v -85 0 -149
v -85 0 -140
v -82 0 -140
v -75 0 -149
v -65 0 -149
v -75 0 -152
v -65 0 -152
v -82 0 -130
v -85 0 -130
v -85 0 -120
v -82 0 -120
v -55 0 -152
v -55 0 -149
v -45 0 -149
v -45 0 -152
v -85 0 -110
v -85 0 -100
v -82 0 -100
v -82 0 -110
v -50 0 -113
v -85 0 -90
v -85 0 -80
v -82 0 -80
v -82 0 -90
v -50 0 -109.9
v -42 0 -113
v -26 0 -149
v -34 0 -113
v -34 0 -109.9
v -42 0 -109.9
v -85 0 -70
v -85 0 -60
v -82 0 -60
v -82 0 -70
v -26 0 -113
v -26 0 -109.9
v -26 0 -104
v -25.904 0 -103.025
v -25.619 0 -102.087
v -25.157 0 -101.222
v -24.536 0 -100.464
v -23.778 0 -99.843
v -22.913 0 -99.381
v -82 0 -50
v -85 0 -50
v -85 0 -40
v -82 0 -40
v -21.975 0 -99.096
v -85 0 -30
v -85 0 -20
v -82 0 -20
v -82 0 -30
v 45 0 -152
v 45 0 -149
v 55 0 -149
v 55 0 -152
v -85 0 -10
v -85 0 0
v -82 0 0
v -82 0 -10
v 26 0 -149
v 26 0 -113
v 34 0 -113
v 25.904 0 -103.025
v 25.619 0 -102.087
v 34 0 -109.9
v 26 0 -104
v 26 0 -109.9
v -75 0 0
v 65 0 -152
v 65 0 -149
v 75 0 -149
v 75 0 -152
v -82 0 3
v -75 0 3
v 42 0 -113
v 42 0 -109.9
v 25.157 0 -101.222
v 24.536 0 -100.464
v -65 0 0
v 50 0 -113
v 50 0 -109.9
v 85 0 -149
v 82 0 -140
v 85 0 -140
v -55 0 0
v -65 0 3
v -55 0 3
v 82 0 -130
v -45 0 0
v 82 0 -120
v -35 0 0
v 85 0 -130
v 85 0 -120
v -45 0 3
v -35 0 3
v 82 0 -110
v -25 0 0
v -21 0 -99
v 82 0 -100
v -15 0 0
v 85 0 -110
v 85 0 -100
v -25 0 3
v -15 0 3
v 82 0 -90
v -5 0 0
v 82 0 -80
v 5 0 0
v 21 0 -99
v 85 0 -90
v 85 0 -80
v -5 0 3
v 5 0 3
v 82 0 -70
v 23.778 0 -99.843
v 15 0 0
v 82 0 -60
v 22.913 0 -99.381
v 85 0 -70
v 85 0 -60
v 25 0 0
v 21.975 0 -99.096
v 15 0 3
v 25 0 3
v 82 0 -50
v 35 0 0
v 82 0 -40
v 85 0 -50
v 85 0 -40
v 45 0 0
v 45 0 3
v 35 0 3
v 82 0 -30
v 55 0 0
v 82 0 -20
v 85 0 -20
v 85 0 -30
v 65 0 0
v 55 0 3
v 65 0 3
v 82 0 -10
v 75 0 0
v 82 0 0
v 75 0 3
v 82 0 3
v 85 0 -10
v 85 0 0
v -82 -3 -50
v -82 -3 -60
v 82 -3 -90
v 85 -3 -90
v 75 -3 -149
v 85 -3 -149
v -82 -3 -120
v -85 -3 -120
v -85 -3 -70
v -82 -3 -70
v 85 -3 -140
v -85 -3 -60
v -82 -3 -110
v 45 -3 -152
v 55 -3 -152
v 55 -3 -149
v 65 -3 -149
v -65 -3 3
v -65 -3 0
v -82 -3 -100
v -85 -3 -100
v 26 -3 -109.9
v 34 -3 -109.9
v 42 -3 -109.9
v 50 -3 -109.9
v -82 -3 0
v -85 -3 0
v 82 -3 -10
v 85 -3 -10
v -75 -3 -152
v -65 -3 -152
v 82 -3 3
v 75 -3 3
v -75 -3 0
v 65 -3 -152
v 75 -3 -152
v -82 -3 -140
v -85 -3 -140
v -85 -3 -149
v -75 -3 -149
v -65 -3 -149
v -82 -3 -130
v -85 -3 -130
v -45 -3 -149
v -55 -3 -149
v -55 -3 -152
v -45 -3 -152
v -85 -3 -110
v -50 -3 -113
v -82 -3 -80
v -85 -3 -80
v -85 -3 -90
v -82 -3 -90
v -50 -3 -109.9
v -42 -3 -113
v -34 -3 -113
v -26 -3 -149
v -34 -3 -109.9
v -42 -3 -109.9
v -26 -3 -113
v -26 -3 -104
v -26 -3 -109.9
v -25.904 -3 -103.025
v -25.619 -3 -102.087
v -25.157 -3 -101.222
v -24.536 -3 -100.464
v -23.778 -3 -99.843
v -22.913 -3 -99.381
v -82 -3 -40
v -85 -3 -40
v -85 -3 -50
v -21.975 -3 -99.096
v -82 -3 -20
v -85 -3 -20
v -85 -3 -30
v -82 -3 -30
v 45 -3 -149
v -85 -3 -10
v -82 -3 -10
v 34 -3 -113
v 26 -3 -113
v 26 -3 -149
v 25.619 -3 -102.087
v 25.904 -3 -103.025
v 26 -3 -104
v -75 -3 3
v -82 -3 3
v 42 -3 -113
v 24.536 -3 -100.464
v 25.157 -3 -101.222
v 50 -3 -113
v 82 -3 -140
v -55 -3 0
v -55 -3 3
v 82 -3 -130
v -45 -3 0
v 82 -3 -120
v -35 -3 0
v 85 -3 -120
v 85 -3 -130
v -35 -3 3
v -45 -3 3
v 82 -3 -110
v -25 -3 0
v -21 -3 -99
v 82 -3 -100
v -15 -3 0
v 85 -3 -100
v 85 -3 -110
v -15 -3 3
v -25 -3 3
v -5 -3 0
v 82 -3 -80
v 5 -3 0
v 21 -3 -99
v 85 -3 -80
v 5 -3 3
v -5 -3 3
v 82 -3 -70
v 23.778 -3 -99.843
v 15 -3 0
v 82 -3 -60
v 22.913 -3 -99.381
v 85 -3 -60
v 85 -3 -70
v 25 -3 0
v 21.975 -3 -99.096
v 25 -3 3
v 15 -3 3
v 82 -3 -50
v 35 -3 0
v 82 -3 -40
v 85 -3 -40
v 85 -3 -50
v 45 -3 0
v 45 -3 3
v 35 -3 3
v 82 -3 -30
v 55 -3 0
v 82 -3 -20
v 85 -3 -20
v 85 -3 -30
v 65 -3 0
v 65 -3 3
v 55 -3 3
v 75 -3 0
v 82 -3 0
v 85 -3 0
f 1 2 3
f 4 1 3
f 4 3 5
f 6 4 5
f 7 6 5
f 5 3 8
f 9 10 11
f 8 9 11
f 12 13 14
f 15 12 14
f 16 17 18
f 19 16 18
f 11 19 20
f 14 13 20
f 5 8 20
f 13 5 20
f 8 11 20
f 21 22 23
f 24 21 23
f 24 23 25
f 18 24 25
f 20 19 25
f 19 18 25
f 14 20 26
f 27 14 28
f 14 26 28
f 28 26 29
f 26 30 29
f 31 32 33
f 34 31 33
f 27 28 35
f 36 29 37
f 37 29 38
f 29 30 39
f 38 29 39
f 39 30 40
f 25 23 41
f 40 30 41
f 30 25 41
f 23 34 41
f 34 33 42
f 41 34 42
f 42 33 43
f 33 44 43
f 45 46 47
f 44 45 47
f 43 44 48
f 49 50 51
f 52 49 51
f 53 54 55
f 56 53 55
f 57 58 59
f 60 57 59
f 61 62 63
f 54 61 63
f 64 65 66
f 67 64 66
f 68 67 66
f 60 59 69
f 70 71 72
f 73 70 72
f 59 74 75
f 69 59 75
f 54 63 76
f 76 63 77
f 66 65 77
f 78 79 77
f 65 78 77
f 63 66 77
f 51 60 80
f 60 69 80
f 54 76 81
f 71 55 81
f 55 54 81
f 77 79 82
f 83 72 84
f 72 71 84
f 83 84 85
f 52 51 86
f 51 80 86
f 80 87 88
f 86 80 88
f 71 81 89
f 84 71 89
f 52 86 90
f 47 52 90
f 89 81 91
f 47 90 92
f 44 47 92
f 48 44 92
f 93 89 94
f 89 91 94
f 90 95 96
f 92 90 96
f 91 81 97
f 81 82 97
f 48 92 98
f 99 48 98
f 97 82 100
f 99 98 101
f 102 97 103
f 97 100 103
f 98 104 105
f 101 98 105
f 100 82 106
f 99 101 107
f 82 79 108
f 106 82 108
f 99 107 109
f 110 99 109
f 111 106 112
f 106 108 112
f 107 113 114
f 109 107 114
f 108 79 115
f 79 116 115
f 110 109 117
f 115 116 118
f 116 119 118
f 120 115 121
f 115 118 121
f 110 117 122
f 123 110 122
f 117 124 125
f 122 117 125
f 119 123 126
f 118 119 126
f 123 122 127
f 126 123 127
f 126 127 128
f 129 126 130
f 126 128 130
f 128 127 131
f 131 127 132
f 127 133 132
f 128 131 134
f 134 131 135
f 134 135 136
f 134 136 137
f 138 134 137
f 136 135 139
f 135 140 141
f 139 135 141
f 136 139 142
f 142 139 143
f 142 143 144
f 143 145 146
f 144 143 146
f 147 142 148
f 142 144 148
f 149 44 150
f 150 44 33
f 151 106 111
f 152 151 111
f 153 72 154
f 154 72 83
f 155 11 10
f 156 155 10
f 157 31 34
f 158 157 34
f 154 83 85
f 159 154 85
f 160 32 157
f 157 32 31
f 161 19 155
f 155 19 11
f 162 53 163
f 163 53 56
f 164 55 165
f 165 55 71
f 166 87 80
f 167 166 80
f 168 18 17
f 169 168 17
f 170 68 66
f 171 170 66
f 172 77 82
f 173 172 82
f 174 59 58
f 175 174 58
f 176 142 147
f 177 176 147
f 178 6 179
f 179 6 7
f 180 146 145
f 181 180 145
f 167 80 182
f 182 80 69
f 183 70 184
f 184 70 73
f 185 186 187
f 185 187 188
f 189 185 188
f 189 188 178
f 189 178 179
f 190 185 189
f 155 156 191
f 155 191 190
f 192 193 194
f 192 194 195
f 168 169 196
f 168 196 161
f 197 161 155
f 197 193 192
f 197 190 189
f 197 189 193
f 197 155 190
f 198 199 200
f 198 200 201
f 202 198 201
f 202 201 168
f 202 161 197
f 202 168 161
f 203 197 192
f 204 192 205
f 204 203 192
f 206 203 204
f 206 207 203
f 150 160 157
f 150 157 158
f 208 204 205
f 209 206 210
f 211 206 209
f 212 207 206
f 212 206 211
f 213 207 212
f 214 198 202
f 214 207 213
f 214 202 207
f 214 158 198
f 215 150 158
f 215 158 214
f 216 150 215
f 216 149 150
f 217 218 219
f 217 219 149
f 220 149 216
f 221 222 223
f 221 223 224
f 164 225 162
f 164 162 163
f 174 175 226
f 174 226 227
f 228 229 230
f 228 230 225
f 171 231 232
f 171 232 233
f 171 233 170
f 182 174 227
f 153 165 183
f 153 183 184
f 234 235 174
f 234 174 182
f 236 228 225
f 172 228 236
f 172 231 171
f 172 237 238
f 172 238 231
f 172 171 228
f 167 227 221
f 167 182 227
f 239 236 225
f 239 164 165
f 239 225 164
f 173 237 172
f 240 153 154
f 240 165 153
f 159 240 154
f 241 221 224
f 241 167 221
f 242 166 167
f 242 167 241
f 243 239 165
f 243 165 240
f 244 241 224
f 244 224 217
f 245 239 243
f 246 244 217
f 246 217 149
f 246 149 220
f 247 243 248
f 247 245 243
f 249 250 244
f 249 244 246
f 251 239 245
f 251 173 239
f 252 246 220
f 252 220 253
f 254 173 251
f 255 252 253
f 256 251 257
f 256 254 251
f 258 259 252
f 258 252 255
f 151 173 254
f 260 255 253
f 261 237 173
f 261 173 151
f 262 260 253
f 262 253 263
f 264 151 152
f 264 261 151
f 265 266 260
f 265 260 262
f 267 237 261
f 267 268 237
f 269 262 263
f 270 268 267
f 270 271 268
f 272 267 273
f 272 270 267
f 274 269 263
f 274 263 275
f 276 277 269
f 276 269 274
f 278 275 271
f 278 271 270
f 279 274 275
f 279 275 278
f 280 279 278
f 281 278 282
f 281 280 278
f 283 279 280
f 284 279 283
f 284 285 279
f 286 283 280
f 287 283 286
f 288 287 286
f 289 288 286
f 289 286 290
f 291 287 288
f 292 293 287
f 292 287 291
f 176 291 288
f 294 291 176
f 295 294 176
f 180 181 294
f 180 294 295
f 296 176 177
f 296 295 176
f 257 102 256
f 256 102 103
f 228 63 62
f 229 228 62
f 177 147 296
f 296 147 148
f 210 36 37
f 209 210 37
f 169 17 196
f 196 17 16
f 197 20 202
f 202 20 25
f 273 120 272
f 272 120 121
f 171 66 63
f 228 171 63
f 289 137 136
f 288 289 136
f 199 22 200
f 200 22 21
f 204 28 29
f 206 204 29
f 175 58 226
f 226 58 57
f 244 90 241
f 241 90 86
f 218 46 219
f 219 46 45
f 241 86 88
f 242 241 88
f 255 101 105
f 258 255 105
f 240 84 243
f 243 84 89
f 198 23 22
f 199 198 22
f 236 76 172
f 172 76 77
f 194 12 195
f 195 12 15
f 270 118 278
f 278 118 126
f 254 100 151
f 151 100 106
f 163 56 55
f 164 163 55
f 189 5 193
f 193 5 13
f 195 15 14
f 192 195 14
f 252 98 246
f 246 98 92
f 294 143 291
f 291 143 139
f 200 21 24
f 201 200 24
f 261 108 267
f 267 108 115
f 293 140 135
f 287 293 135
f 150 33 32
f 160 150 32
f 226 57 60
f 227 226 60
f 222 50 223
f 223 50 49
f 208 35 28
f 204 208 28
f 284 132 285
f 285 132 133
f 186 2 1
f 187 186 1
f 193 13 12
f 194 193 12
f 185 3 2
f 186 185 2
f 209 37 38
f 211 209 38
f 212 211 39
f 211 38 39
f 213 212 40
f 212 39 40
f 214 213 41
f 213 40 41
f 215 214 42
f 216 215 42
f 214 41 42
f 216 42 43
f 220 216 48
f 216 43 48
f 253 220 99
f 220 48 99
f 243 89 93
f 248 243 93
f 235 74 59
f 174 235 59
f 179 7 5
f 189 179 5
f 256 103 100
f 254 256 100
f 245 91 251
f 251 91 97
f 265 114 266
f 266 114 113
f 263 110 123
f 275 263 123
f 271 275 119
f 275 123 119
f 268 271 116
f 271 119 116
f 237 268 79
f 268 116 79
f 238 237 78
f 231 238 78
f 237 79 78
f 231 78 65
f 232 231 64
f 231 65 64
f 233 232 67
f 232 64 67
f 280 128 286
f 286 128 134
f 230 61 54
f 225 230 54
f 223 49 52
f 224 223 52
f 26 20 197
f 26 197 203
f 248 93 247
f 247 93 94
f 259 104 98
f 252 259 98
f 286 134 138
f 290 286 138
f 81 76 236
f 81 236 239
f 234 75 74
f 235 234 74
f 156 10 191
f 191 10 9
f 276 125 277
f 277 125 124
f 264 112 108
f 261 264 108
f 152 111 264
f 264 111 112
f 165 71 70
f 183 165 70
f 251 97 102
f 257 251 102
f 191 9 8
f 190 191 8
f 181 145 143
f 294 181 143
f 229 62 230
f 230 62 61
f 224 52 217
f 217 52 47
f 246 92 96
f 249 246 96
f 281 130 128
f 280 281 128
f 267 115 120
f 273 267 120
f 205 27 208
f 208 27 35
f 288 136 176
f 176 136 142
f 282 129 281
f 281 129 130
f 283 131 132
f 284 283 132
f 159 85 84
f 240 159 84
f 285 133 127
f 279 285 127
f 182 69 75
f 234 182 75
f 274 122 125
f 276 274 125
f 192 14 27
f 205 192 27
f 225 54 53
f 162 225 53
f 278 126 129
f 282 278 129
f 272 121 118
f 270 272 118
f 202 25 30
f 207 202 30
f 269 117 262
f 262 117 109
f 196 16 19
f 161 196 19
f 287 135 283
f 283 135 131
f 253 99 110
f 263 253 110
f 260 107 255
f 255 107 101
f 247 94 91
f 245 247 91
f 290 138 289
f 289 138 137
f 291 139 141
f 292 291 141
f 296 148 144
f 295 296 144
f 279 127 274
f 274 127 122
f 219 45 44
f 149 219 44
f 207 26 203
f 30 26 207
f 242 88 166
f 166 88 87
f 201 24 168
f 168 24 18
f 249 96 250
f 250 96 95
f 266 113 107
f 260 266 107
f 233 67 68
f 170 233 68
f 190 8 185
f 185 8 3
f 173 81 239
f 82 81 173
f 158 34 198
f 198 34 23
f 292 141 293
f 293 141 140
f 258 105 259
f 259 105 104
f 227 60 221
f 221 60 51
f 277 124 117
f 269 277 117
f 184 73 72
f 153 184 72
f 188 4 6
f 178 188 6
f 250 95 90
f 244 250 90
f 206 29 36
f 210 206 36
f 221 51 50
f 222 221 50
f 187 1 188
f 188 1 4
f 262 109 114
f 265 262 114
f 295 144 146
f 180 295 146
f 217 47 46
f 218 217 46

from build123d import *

# Parameters (mm, degrees)
F1_W     = 8
F1_H     = 3.1
F2_DEPTH = 3


with BuildPart() as f2:
    # F1 (on Front) → F2 (new body)
    with BuildSketch(Plane.XZ):
        with BuildLine():
            Line((82, 0), (82, 3))
            Line((82, 3), (75, 3))
            Line((75, 3), (75, 0))
            Line((75, 0), (65, 0))
            Line((65, 0), (65, 3))
            Line((65, 3), (55, 3))
            Line((55, 3), (55, 0))
            Line((55, 0), (45, 0))
            Line((45, 0), (45, 3))
            Line((45, 3), (35, 3))
            Line((35, 3), (35, 0))
            Line((35, 0), (25, 0))
            Line((25, 0), (25, 3))
            Line((25, 3), (15, 3))
            Line((15, 3), (15, 0))
            Line((15, 0), (5, 0))
            Line((5, 0), (5, 3))
            Line((5, 3), (-5, 3))
            Line((-5, 3), (-5, 0))
            Line((-5, 0), (-15, 0))
            Line((-15, 0), (-15, 3))
            Line((-15, 3), (-25, 3))
            Line((-25, 3), (-25, 0))
            Line((-25, 0), (-35, 0))
            Line((-35, 0), (-35, 3))
            Line((-35, 3), (-45, 3))
            Line((-45, 3), (-45, 0))
            Line((-45, 0), (-55, 0))
            Line((-55, 0), (-55, 3))
            Line((-55, 3), (-65, 3))
            Line((-65, 3), (-65, 0))
            Line((-65, 0), (-75, 0))
            Line((-75, 0), (-75, 3))
            Line((-75, 3), (-82, 3))
            Line((-82, 3), (-82, 0))
            Line((-82, 0), (-85, 0))
            Line((-85, 0), (-85, -10))
            Line((-85, -10), (-82, -10))
            Line((-82, -10), (-82, -20))
            Line((-82, -20), (-85, -20))
            Line((-85, -20), (-85, -30))
            Line((-85, -30), (-82, -30))
            Line((-82, -30), (-82, -40))
            Line((-82, -40), (-85, -40))
            Line((-85, -40), (-85, -50))
            Line((-85, -50), (-82, -50))
            Line((-82, -50), (-82, -60))
            Line((-82, -60), (-85, -60))
            Line((-85, -60), (-85, -70))
            Line((-85, -70), (-82, -70))
            Line((-82, -70), (-82, -80))
            Line((-82, -80), (-85, -80))
            Line((-85, -80), (-85, -90))
            Line((-85, -90), (-82, -90))
            Line((-82, -90), (-82, -100))
            Line((-82, -100), (-85, -100))
            Line((-85, -100), (-85, -110))
            Line((-85, -110), (-82, -110))
            Line((-82, -110), (-82, -120))
            Line((-82, -120), (-85, -120))
            Line((-85, -120), (-85, -130))
            Line((-85, -130), (-82, -130))
            Line((-82, -130), (-82, -140))
            Line((-82, -140), (-85, -140))
            Line((-85, -140), (-85, -149))
            Line((-85, -149), (-75, -149))
            Line((-75, -149), (-75, -152))
            Line((-75, -152), (-65, -152))
            Line((-65, -152), (-65, -149))
            Line((-65, -149), (-55, -149))
            Line((-55, -149), (-55, -152))
            Line((-55, -152), (-45, -152))
            Line((-45, -152), (-45, -149))
            Line((-45, -149), (-26, -149))
            Line((-26, -149), (-26, -113))
            Line((-26, -113), (-34, -113))
            Line((-34, -113), (-34, -109.9))
            Line((-34, -109.9), (-26, -109.9))
            Line((-26, -109.9), (-26, -104))
            ThreePointArc((-26, -104), (-24.535534, -100.464466), (-21, -99))
            Line((-21, -99), (21, -99))
            ThreePointArc((21, -99), (24.535534, -100.464466), (26, -104))
            Line((26, -104), (26, -109.9))
            Line((26, -109.9), (34, -109.9))
            Line((34, -109.9), (34, -113))
            Line((34, -113), (26, -113))
            Line((26, -113), (26, -149))
            Line((26, -149), (45, -149))
            Line((45, -149), (45, -152))
            Line((45, -152), (55, -152))
            Line((55, -152), (55, -149))
            Line((55, -149), (65, -149))
            Line((65, -149), (65, -152))
            Line((65, -152), (75, -152))
            Line((75, -152), (75, -149))
            Line((75, -149), (85, -149))
            Line((85, -149), (85, -140))
            Line((85, -140), (82, -140))
            Line((82, -140), (82, -130))
            Line((82, -130), (85, -130))
            Line((85, -130), (85, -120))
            Line((85, -120), (82, -120))
            Line((82, -120), (82, -110))
            Line((82, -110), (85, -110))
            Line((85, -110), (85, -100))
            Line((85, -100), (82, -100))
            Line((82, -100), (82, -90))
            Line((82, -90), (85, -90))
            Line((85, -90), (85, -80))
            Line((85, -80), (82, -80))
            Line((82, -80), (82, -70))
            Line((82, -70), (85, -70))
            Line((85, -70), (85, -60))
            Line((85, -60), (82, -60))
            Line((82, -60), (82, -50))
            Line((82, -50), (85, -50))
            Line((85, -50), (85, -40))
            Line((85, -40), (82, -40))
            Line((82, -40), (82, -30))
            Line((82, -30), (85, -30))
            Line((85, -30), (85, -20))
            Line((85, -20), (82, -20))
            Line((82, -20), (82, -10))
            Line((82, -10), (85, -10))
            Line((85, -10), (85, 0))
            Line((85, 0), (82, 0))
        make_face()
        with Locations((-46, -111.45)):
            Rectangle(F1_W, F1_H, mode=Mode.SUBTRACT)
        with Locations((46, -111.45)):
            Rectangle(F1_W, F1_H, mode=Mode.SUBTRACT)
    extrude(amount=F2_DEPTH)


solid = f2.part
